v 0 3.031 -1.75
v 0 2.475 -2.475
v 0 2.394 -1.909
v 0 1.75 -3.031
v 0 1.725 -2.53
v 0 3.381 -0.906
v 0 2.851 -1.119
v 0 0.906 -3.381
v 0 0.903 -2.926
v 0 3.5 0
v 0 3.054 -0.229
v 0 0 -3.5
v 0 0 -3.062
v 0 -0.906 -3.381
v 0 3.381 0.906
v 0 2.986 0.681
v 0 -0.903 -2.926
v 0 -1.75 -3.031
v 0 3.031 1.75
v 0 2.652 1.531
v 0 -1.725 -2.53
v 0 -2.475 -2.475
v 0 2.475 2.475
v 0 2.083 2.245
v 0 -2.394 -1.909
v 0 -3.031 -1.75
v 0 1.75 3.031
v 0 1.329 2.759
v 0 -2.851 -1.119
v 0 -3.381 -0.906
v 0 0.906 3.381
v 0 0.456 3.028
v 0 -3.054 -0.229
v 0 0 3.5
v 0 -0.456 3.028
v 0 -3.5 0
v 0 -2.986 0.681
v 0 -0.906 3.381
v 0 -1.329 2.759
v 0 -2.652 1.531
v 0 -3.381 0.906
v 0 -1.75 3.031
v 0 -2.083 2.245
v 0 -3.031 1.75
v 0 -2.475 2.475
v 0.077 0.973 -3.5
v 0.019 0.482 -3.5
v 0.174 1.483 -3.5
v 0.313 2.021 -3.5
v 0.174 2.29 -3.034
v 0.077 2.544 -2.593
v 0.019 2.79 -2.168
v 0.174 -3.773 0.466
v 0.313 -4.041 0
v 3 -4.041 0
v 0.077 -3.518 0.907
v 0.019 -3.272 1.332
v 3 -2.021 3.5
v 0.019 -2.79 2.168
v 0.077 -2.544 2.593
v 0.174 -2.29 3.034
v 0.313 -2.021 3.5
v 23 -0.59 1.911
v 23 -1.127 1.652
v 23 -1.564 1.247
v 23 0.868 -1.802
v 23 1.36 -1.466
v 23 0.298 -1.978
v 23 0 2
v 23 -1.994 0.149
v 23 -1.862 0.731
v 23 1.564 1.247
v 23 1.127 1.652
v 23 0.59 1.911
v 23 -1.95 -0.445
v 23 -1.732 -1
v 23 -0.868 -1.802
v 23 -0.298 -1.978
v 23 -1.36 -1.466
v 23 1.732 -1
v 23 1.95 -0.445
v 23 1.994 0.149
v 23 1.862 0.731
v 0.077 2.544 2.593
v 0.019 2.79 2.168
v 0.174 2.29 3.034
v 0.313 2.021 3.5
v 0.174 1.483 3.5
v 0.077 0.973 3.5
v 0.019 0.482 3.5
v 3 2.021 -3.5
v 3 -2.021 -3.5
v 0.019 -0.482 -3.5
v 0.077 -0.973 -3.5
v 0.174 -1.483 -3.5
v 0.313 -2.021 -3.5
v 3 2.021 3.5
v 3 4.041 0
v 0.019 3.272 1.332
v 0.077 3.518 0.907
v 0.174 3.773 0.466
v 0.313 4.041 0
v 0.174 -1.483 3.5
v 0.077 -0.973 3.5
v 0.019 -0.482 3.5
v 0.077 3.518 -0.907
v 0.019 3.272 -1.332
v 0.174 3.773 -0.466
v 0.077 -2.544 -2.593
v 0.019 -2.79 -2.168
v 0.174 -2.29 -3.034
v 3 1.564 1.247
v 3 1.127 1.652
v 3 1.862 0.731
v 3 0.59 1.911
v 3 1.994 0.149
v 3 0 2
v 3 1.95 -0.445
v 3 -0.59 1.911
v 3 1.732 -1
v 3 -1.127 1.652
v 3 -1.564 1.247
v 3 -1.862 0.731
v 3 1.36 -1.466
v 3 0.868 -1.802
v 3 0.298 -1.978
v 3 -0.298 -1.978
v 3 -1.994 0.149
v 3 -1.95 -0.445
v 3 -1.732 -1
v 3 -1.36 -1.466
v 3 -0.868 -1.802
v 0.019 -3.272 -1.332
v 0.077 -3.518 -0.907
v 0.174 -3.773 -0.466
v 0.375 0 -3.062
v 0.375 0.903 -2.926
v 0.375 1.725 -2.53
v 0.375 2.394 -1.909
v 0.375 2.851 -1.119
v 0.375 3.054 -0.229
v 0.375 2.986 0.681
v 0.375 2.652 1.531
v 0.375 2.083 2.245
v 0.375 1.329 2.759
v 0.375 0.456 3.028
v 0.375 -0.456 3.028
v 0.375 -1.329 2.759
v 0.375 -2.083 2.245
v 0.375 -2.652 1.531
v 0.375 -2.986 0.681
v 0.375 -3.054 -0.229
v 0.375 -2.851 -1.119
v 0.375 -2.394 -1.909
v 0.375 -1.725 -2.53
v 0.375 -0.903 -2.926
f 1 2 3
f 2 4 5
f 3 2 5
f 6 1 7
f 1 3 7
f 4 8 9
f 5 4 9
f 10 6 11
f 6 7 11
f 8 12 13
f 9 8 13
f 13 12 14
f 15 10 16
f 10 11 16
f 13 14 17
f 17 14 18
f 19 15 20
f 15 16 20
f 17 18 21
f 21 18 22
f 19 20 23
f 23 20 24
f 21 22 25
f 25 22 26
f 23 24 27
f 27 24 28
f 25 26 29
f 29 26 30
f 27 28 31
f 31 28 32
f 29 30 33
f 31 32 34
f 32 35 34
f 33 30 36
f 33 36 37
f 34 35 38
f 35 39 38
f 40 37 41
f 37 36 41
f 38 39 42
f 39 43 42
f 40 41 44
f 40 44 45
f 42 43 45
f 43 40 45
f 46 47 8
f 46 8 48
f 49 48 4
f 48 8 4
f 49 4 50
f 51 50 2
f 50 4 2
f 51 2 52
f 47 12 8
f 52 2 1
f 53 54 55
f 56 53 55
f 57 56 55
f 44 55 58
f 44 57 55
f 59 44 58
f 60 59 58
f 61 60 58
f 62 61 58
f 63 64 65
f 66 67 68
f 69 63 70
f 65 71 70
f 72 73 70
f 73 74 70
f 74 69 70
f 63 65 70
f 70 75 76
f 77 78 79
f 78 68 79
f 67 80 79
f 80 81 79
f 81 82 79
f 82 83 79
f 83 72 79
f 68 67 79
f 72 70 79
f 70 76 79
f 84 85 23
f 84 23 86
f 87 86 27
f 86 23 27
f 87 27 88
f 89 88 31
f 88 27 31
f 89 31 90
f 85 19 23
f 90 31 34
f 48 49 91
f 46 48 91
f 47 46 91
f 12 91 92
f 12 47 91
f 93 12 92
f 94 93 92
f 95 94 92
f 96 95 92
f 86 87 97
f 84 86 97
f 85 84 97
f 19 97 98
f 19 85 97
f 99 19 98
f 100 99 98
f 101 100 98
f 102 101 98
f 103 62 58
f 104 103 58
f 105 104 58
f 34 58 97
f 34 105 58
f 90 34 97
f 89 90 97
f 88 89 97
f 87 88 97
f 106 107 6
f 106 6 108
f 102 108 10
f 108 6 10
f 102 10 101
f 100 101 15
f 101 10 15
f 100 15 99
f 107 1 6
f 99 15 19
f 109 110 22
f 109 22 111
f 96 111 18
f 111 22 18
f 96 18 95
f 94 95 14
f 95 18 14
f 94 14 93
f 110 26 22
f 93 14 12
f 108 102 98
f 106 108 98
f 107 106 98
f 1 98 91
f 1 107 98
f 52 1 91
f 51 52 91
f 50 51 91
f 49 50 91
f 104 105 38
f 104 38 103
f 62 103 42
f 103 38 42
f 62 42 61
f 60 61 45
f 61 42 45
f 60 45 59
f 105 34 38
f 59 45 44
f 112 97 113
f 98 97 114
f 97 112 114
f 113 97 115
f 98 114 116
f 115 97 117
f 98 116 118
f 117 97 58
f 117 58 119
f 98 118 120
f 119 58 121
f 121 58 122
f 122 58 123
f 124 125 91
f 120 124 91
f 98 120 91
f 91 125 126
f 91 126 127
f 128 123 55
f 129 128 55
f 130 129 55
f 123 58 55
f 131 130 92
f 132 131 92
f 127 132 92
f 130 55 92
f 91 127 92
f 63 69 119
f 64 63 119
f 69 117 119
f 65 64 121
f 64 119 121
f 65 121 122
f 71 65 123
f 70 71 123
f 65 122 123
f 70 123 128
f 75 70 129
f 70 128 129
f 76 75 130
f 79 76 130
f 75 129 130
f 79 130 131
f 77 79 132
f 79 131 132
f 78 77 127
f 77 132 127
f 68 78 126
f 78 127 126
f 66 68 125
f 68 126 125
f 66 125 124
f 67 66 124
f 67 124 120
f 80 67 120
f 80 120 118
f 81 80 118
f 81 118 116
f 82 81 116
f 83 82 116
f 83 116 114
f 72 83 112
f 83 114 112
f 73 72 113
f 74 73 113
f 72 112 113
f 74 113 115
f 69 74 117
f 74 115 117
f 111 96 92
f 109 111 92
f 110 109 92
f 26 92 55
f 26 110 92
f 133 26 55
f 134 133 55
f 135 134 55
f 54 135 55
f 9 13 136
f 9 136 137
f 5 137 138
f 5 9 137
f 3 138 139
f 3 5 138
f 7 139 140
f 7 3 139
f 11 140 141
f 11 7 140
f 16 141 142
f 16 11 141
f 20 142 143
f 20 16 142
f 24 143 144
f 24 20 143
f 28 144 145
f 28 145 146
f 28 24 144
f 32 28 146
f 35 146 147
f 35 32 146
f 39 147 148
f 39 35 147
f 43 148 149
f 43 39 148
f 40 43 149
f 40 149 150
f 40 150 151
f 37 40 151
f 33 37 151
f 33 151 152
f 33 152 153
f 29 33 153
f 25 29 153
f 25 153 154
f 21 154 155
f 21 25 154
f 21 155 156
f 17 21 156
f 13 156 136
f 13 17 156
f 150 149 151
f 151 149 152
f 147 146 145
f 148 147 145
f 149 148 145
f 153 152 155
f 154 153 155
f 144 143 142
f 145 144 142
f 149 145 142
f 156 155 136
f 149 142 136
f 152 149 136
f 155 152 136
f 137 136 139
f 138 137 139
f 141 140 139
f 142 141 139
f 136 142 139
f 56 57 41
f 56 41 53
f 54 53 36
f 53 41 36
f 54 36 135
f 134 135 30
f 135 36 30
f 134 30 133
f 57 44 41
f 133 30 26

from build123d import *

# Parameters (mm, degrees)
SKETCH2_R     = 4.081986143
HEX_DIE_DEPTH = 3
SKETCH4_R     = 3.0625
INDENT_DEPTH  = 0.375


with BuildPart() as part:
    # BodySke → Base-Revolve (revolve)
    with BuildSketch(Plane.XY, mode=Mode.PRIVATE) as base_revolve_sk:
        Polygon((3, 2), (3, 4.041570439), (0.312675839, 4.041570439), (0, 3.5), (0, 0), (23, 0), (23, 2), align=None)
    revolve(base_revolve_sk.sketch.rotate(Axis((-25.4, 0, 0), (1, 0, 0)), 90), axis=Axis((-25.4, 0, 0), (1, 0, 0)))

    # Sketch2 → Hex-Die (cut)
    with BuildSketch(Plane(origin=(0, 0, 0), x_dir=(0, 0, -1), z_dir=(1, 0, 0))):
        Circle(SKETCH2_R)
        Polygon((-3.5, 2.020725951), (0, 4.041451902), (3.5, 2.020725951), (3.5, -2.020725951), (0, -4.041451902), (-3.5, -2.020725951), align=None, mode=Mode.SUBTRACT)
    extrude(amount=HEX_DIE_DEPTH, mode=Mode.SUBTRACT)

    # Sketch4 → Indent (cut)
    with BuildSketch(Plane(origin=(0, 0, 0), x_dir=(0, 0, -1), z_dir=(1, 0, 0))):
        Circle(SKETCH4_R)
    extrude(amount=INDENT_DEPTH, mode=Mode.SUBTRACT)


solid = part.part
